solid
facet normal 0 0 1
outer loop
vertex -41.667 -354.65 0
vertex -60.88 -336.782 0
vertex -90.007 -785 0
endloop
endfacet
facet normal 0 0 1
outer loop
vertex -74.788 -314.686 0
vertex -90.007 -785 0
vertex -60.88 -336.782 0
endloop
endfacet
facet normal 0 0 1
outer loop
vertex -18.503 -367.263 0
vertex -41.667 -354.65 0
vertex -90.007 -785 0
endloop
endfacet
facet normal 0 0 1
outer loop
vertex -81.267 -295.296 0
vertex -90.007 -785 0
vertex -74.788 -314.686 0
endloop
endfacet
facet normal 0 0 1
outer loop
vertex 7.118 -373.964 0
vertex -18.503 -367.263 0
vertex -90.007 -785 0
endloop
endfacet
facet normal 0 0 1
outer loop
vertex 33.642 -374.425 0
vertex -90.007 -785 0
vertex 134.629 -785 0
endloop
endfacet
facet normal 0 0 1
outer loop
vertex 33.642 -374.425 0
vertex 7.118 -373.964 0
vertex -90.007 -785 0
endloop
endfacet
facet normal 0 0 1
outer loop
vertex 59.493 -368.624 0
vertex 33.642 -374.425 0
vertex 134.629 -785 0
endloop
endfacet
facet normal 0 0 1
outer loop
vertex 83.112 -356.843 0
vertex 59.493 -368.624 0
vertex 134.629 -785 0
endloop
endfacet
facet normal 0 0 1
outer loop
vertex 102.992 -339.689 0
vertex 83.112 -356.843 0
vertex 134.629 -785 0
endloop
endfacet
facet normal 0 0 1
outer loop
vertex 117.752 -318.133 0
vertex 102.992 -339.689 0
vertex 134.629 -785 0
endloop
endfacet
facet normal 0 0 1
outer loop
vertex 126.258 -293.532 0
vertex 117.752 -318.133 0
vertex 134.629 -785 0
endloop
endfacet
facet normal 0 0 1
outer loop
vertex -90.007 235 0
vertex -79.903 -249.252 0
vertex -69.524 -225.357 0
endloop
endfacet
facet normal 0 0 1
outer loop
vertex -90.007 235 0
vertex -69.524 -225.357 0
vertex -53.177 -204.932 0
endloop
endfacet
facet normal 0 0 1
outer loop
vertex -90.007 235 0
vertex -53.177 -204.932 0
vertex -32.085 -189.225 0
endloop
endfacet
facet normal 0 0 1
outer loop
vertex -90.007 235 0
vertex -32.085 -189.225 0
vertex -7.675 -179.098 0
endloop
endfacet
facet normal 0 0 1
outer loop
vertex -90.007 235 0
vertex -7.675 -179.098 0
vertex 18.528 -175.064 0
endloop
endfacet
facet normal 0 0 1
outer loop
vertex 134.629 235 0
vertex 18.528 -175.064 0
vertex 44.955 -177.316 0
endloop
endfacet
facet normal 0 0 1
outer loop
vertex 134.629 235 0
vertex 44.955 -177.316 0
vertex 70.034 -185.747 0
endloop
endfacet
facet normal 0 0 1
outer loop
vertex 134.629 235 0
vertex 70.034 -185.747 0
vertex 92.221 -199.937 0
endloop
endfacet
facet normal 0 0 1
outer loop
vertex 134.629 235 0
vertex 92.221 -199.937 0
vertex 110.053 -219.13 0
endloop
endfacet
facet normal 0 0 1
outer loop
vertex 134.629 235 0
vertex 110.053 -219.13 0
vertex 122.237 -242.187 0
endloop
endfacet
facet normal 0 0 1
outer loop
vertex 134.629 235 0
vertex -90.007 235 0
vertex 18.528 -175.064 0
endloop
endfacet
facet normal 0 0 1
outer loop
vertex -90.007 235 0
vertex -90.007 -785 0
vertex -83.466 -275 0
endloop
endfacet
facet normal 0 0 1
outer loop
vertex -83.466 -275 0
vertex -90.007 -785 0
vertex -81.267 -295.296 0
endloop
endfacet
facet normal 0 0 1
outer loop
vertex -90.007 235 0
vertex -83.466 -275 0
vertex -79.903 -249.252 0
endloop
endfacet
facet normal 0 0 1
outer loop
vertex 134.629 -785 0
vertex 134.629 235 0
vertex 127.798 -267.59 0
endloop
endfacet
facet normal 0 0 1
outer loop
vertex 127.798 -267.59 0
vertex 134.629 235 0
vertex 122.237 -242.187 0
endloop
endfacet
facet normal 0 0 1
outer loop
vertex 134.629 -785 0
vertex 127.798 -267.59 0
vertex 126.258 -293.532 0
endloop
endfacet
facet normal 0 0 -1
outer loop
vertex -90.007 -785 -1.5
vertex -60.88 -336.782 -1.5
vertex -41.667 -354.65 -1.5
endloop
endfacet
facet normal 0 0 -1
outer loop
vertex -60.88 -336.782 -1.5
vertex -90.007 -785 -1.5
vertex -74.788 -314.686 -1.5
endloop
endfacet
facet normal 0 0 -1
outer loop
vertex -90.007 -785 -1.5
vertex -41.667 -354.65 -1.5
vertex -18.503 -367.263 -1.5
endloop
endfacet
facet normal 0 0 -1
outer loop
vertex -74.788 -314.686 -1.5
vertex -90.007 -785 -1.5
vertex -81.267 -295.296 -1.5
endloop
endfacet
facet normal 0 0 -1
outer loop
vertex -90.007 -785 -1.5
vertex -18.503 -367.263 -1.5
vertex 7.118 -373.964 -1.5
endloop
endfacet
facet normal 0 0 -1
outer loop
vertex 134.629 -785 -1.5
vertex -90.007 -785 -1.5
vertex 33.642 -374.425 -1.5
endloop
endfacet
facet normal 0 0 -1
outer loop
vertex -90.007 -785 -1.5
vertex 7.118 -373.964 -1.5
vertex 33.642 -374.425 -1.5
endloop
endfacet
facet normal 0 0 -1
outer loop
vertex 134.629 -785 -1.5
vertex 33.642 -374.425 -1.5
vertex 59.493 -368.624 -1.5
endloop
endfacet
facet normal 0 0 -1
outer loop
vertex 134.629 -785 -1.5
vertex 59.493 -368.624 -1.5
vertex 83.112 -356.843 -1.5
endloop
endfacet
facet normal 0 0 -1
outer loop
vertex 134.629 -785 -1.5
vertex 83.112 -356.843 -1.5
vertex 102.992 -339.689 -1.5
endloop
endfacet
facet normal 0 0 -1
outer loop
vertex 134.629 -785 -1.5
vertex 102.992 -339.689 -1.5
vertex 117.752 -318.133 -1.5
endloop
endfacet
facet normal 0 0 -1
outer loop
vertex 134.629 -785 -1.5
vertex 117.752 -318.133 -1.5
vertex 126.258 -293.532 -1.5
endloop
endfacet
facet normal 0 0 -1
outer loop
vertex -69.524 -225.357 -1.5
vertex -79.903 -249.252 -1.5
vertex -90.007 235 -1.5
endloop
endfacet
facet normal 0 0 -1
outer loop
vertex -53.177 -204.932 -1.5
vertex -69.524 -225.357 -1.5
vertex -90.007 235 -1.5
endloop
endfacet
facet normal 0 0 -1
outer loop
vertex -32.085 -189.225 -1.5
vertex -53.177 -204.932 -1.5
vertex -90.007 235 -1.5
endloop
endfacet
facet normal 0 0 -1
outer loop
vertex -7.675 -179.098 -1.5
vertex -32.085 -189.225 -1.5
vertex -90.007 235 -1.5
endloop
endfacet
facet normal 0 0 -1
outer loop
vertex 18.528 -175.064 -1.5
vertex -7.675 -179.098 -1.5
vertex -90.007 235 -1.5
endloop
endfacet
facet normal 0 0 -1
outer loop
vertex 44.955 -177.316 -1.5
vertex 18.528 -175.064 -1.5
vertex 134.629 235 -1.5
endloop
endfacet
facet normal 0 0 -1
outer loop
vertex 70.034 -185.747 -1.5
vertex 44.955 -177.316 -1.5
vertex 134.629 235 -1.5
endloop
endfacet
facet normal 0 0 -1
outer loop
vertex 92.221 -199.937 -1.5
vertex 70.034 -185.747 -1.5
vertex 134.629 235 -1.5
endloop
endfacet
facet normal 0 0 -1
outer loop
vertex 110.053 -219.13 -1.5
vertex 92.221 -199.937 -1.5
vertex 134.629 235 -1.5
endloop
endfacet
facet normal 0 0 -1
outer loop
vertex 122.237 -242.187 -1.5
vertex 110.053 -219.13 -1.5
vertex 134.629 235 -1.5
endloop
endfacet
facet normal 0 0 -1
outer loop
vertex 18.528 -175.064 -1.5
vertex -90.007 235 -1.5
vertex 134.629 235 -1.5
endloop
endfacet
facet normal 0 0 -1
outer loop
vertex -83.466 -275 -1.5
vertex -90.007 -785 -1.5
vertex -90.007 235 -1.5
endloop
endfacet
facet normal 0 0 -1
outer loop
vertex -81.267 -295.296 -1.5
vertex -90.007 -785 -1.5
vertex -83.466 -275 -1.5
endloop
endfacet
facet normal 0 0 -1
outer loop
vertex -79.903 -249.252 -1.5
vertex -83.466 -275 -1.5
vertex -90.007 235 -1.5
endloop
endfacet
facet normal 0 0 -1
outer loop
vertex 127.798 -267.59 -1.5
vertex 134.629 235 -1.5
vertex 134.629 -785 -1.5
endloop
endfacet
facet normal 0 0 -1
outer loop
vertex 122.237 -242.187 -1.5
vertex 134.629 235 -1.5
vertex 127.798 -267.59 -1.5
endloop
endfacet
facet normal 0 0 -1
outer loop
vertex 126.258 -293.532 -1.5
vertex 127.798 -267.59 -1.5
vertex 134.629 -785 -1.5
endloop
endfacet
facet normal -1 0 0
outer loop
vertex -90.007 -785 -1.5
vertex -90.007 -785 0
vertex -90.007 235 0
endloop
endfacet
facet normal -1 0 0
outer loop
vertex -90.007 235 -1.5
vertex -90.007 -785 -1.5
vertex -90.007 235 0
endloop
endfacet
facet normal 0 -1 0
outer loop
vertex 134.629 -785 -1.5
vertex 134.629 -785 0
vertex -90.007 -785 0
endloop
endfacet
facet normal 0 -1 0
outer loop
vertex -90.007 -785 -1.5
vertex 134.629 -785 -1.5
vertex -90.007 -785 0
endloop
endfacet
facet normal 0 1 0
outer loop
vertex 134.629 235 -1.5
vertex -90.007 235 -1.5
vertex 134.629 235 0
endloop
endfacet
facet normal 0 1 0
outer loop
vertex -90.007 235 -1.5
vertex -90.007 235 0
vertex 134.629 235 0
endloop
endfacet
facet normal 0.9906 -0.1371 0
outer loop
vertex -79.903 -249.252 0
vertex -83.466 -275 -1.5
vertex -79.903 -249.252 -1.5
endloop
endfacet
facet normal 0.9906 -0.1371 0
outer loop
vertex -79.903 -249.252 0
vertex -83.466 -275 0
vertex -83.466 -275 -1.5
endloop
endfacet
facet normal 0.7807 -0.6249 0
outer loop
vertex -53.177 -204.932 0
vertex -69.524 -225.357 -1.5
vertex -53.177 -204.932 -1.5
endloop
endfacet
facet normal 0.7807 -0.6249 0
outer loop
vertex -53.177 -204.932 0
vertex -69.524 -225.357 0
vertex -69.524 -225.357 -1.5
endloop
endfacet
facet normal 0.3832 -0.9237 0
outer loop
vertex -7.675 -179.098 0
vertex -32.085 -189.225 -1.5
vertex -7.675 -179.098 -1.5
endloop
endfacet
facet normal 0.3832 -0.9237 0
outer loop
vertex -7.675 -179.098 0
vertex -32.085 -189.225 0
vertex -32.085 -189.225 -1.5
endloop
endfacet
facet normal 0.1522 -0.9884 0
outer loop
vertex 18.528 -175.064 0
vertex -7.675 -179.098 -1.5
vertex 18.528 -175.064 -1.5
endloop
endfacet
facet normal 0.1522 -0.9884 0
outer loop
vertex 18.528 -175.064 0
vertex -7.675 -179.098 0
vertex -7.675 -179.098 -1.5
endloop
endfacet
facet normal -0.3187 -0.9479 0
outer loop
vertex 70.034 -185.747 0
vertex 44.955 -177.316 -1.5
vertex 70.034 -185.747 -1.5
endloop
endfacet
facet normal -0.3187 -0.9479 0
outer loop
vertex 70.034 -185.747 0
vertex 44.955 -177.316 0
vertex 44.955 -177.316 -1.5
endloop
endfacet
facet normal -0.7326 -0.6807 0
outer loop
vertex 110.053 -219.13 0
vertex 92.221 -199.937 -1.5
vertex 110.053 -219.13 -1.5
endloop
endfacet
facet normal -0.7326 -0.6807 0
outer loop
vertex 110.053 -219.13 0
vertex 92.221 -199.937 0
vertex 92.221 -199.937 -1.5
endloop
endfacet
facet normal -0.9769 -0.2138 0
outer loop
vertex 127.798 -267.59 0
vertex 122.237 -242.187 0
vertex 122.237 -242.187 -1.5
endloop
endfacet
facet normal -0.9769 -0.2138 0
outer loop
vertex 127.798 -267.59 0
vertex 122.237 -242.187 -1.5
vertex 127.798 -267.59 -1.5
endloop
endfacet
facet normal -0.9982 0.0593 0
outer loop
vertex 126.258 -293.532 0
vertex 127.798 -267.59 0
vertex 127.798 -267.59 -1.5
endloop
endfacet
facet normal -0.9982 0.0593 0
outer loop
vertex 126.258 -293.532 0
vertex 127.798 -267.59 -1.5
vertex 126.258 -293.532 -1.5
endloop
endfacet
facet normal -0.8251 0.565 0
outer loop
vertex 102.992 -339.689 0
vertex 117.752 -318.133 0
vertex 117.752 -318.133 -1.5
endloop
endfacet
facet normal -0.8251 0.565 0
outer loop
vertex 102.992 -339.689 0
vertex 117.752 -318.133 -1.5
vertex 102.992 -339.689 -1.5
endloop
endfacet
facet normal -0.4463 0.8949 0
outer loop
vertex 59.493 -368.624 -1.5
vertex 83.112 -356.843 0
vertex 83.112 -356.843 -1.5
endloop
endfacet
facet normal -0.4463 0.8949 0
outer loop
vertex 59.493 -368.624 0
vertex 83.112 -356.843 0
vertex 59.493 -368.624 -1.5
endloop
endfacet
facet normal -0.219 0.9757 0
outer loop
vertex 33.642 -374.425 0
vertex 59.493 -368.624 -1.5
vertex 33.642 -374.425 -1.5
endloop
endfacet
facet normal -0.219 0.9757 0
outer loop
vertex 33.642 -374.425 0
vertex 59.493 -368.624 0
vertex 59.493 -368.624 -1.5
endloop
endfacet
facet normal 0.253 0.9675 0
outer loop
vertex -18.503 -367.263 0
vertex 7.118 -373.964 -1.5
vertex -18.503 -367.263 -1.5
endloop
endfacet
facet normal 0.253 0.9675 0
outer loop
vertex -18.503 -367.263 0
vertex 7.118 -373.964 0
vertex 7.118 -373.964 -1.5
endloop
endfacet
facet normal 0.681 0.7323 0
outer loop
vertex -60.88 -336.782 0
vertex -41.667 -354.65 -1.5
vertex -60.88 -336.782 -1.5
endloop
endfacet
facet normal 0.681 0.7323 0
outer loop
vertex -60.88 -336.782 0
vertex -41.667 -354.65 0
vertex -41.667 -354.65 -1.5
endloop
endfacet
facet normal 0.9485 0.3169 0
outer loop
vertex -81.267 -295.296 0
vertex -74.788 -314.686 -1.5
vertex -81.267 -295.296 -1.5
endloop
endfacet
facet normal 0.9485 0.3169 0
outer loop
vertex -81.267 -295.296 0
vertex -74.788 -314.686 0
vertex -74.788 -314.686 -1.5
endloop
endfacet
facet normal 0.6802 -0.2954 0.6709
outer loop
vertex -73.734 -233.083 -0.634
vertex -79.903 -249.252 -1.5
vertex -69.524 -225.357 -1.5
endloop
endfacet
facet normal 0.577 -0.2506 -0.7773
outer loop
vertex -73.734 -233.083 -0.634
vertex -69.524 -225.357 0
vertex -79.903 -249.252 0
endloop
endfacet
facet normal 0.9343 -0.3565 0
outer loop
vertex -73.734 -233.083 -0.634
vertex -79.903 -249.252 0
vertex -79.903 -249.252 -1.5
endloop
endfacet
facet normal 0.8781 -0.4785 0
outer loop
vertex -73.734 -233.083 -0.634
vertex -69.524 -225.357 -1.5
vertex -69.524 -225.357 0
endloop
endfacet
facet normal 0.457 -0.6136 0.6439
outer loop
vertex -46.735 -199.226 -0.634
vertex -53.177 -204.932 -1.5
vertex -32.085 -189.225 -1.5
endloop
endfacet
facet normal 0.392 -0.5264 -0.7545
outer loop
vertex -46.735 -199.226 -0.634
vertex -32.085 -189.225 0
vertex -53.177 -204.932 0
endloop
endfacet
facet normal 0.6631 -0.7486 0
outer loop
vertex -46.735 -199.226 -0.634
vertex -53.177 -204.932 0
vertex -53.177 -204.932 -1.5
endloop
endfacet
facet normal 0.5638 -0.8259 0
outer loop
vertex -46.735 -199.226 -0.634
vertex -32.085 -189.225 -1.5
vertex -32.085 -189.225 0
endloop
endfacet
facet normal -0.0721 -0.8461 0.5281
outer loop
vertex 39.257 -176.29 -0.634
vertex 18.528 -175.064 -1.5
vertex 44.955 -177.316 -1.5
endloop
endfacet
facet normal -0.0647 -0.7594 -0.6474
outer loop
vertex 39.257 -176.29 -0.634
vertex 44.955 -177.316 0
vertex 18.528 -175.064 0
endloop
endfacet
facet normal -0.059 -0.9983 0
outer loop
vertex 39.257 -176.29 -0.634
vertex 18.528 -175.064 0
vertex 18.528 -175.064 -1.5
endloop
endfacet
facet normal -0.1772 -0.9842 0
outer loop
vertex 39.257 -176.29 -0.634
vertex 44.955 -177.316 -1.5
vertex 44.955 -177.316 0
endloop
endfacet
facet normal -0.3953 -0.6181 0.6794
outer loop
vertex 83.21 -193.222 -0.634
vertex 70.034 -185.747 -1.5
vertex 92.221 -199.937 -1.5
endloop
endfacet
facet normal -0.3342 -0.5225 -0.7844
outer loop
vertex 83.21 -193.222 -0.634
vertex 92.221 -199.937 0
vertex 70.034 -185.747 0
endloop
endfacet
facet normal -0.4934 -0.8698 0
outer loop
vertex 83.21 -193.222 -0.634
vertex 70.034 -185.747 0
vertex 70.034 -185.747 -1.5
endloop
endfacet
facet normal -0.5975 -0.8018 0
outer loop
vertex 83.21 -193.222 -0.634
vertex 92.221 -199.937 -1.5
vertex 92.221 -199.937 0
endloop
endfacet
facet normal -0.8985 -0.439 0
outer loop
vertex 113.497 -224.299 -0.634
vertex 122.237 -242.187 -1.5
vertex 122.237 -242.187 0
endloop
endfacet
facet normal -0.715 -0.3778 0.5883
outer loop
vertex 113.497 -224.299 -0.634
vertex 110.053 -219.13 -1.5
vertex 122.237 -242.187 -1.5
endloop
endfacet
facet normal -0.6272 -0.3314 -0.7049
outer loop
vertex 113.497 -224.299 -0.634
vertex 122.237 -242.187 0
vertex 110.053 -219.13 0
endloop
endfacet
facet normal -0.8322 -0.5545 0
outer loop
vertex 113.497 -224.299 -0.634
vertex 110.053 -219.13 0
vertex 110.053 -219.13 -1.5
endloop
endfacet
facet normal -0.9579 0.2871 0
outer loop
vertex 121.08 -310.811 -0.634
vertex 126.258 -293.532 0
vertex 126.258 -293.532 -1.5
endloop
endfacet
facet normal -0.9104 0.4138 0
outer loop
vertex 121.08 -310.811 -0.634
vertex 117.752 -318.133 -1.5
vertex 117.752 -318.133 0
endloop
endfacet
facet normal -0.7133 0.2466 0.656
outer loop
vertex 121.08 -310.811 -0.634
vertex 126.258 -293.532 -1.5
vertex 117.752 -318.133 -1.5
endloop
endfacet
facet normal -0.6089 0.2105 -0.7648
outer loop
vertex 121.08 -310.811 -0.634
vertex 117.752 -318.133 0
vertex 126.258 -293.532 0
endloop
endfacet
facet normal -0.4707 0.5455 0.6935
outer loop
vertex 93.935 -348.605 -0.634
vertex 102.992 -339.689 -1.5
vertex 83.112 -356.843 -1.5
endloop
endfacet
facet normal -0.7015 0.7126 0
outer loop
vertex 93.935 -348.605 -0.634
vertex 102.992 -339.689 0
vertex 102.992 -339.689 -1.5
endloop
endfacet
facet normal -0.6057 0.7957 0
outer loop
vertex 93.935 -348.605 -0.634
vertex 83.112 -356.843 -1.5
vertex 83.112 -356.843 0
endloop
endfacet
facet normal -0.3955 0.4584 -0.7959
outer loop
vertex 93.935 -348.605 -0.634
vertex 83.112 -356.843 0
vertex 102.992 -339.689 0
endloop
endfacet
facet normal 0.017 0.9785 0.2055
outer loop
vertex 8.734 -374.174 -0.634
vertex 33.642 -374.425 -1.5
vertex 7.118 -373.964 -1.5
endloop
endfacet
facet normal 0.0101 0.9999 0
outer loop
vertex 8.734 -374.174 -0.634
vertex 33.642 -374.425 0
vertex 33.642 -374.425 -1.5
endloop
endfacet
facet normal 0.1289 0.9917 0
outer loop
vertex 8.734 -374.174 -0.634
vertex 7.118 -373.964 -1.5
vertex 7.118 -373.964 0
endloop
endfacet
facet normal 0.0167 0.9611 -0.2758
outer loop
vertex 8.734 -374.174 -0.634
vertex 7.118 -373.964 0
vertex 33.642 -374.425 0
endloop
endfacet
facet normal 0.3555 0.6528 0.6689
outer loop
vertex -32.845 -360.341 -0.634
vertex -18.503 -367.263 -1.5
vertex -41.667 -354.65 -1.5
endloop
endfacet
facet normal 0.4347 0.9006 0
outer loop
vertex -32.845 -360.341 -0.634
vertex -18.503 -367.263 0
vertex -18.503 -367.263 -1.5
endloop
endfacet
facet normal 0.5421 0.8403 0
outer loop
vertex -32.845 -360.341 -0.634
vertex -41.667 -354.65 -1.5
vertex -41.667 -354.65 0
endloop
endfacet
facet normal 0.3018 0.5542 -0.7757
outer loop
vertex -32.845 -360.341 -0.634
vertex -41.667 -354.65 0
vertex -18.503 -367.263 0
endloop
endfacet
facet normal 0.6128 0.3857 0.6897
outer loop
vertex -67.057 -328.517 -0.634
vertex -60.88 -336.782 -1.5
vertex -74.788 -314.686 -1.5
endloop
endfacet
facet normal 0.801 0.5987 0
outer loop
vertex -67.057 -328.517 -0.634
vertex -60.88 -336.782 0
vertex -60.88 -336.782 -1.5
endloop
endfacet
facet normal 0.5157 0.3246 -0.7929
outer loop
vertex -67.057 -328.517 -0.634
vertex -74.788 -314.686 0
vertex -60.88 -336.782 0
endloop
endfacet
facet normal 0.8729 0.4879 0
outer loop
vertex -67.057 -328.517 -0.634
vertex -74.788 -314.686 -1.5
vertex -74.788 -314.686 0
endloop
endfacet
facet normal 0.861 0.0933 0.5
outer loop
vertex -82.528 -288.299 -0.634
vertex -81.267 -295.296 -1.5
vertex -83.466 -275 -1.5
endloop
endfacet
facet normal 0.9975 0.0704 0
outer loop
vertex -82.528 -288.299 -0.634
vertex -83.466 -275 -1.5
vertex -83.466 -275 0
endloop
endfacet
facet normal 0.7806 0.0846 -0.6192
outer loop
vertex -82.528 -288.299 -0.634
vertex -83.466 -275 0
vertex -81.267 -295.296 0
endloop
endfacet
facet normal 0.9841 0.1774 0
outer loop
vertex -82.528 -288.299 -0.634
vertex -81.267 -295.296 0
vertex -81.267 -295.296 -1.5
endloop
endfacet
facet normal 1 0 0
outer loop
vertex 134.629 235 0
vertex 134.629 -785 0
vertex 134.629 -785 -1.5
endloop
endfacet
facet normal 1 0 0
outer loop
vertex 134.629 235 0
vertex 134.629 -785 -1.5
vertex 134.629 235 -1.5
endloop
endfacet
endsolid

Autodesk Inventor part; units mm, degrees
ref_plane "YZ Plane" through (0, 0, 0) normal (1, 0, 0) x (0, 1, 0)
ref_plane "XZ Plane" through (0, 0, 0) normal (0, 1, 0) x (-1, 0, 0)
ref_plane "Work Plane1" through (0, 0, 0) normal (0, 0, 1) x (1, 0, 0)
sketch "Sketch1" plane through (0, 0, 0) normal (0, 0, 1) x (1, 0, 0)
  line L0 (-90.0071, -785) -> (-90.0071, 235)
  line L1 (134.6291, -785) -> (-90.0071, -785)
  line L2 (134.6291, -785) -> (134.6291, 235)
  line L3 (-90.0071, 235) -> (134.6291, 235)
  spline S0 degree 3 poles (-83.4665, -275) (-83.4665, -270.5526) (-82.9168, -262.7698) (-81.2022, -254.0249) (-79.4626, -247.5768) (-78.0785, -243.3409) (-76.0752, -238.1427) (-74.2575, -234.0687) (-71.7257, -229.0988) (-69.4967, -225.2274) (-66.4671, -220.5344) (-63.8533, -216.9028) (-60.3609, -212.5309) (-57.3922, -209.1725) (-53.4761, -205.1609) (-50.1847, -202.1053) (-45.8867, -198.4886) (-42.3073, -195.7614) (-37.6715, -192.5693) (-33.84, -190.1925) (-28.9123, -187.4503) (-24.8659, -185.4423) (-19.6933, -183.1709) (-15.4701, -181.5469) (-10.1006, -179.7632) (-5.7393, -178.5349) (-0.2217, -177.2517) (4.2386, -176.428) (9.8552, -175.6545) (14.375, -175.2412) (20.0412, -174.9828) (24.5808, -174.9828) (30.247, -175.2412) (34.7668, -175.6545) (40.3834, -176.428) (44.8437, -177.2517) (50.3613, -178.5349) (54.7226, -179.7632) (60.092, -181.5469) (64.3153, -183.1709) (69.4878, -185.4423) (73.5343, -187.4503) (78.4619, -190.1925) (82.2935, -192.5693) (86.9292, -195.7614) (90.5087, -198.4886) (94.8067, -202.1053) (98.098, -205.1609) (102.0141, -209.1725) (104.9829, -212.5309) (108.4753, -216.9028) (111.089, -220.5344) (114.1187, -225.2274) (116.3477, -229.0988) (118.8794, -234.0687) (120.6972, -238.1427) (122.7004, -243.3409) (124.0846, -247.5768) (125.5343, -252.9502) (126.4672, -257.3042) (127.3447, -262.7966) (127.8142, -267.2225) (128.108, -272.775) (128.108, -277.225) (127.8142, -282.7775) (127.3447, -287.2034) (126.4672, -292.6958) (125.5343, -297.0498) (124.0846, -302.4232) (122.7004, -306.6591) (120.6972, -311.8573) (118.8794, -315.9313) (116.3477, -320.9012) (114.1187, -324.7726) (111.089, -329.4656) (108.4753, -333.0972) (104.9829, -337.4691) (102.0141, -340.8275) (98.098, -344.8391) (94.8067, -347.8947) (90.5087, -351.5114) (86.9292, -354.2386) (82.2935, -357.4307) (78.4619, -359.8075) (73.5343, -362.5497) (69.4878, -364.5577) (64.3153, -366.8291) (60.092, -368.4531) (54.7226, -370.2368) (50.3613, -371.4651) (44.8437, -372.7483) (40.3834, -373.572) (34.7668, -374.3455) (30.247, -374.7588) (24.5808, -375.0172) (20.0412, -375.0172) (14.375, -374.7588) (9.8552, -374.3455) (4.2386, -373.572) (-0.2217, -372.7483) (-5.7393, -371.4651) (-10.1006, -370.2368) (-15.4701, -368.4531) (-19.6933, -366.8291) (-24.8659, -364.5577) (-28.9123, -362.5497) (-33.84, -359.8075) (-37.6715, -357.4307) (-42.3073, -354.2386) (-45.8867, -351.5114) (-50.1847, -347.8947) (-53.4761, -344.8391) (-57.3922, -340.8275) (-60.3609, -337.4691) (-63.8533, -333.0972) (-66.4671, -329.4656) (-69.4967, -324.7726) (-71.7257, -320.9012) (-74.2575, -315.9313) (-76.0752, -311.8573) (-78.0785, -306.6591) (-79.4626, -302.4232) (-81.2022, -295.9751) (-82.9168, -287.2302) (-83.4665, -279.4474) (-83.4665, -275) knots -6.283185 -6.283185 -6.283185 -6.283185 -6.152286 -6.054111 -6.021386 -5.955936 -5.923211 -5.857761 -5.825036 -5.759587 -5.726862 -5.661412 -5.628687 -5.563237 -5.530512 -5.465062 -5.432337 -5.366887 -5.334163 -5.268713 -5.235988 -5.170538 -5.137813 -5.072363 -5.039638 -4.974188 -4.941463 -4.876014 -4.843289 -4.777839 -4.745114 -4.679664 -4.646939 -4.581489 -4.548764 -4.483315 -4.45059 -4.38514 -4.352415 -4.286965 -4.25424 -4.18879 -4.156065 -4.090615 -4.057891 -3.992441 -3.959716 -3.894266 -3.861541 -3.796091 -3.763366 -3.697916 -3.665191 -3.599742 -3.567017 -3.501567 -3.468842 -3.403392 -3.370667 -3.305217 -3.272492 -3.207043 -3.174318 -3.108868 -3.076143 -3.010693 -2.977968 -2.912518 -2.879793 -2.814343 -2.781618 -2.716169 -2.683444 -2.617994 -2.585269 -2.519819 -2.487094 -2.421644 -2.388919 -2.32347 -2.290745 -2.225295 -2.19257 -2.12712 -2.094395 -2.028945 -1.99622 -1.93077 -1.898046 -1.832596 -1.799871 -1.734421 -1.701696 -1.636246 -1.603521 -1.538071 -1.505346 -1.439897 -1.407172 -1.341722 -1.308997 -1.243547 -1.210822 -1.145372 -1.112647 -1.047198 -1.014473 -0.949023 -0.916298 -0.850848 -0.818123 -0.752673 -0.719948 -0.654498 -0.621774 -0.556324 -0.523599 -0.458149 -0.425424 -0.359974 -0.327249 -0.261799 -0.229074 -0.1309 0 0 0 0
  point P0 (0, 0)
  point P1 (-83.4665, -275)
extrude "Plate1" add sketch "Sketch1" against normal blind 1.5
equation "\"d0\" = Thickness"
equation "\"BendRadius\" = Thickness"
equation "\"BendReliefWidth\" = Thickness"
equation "\"BendReliefDepth\" = 0.5 * Thickness"
equation "\"CornerReliefSize\" = 4 * Thickness"
equation "\"MinimumRemnant\" = 2 * Thickness"
equation "\"TransitionRadius\" = BendRadius"
equation "\"JacobiRadiusSize\" = BendRadius"
equation "\"GapSize\" = Thickness"
equation "\"Thickness\" = 1.5"
properties part number "CARCASA_ALUM_2"
